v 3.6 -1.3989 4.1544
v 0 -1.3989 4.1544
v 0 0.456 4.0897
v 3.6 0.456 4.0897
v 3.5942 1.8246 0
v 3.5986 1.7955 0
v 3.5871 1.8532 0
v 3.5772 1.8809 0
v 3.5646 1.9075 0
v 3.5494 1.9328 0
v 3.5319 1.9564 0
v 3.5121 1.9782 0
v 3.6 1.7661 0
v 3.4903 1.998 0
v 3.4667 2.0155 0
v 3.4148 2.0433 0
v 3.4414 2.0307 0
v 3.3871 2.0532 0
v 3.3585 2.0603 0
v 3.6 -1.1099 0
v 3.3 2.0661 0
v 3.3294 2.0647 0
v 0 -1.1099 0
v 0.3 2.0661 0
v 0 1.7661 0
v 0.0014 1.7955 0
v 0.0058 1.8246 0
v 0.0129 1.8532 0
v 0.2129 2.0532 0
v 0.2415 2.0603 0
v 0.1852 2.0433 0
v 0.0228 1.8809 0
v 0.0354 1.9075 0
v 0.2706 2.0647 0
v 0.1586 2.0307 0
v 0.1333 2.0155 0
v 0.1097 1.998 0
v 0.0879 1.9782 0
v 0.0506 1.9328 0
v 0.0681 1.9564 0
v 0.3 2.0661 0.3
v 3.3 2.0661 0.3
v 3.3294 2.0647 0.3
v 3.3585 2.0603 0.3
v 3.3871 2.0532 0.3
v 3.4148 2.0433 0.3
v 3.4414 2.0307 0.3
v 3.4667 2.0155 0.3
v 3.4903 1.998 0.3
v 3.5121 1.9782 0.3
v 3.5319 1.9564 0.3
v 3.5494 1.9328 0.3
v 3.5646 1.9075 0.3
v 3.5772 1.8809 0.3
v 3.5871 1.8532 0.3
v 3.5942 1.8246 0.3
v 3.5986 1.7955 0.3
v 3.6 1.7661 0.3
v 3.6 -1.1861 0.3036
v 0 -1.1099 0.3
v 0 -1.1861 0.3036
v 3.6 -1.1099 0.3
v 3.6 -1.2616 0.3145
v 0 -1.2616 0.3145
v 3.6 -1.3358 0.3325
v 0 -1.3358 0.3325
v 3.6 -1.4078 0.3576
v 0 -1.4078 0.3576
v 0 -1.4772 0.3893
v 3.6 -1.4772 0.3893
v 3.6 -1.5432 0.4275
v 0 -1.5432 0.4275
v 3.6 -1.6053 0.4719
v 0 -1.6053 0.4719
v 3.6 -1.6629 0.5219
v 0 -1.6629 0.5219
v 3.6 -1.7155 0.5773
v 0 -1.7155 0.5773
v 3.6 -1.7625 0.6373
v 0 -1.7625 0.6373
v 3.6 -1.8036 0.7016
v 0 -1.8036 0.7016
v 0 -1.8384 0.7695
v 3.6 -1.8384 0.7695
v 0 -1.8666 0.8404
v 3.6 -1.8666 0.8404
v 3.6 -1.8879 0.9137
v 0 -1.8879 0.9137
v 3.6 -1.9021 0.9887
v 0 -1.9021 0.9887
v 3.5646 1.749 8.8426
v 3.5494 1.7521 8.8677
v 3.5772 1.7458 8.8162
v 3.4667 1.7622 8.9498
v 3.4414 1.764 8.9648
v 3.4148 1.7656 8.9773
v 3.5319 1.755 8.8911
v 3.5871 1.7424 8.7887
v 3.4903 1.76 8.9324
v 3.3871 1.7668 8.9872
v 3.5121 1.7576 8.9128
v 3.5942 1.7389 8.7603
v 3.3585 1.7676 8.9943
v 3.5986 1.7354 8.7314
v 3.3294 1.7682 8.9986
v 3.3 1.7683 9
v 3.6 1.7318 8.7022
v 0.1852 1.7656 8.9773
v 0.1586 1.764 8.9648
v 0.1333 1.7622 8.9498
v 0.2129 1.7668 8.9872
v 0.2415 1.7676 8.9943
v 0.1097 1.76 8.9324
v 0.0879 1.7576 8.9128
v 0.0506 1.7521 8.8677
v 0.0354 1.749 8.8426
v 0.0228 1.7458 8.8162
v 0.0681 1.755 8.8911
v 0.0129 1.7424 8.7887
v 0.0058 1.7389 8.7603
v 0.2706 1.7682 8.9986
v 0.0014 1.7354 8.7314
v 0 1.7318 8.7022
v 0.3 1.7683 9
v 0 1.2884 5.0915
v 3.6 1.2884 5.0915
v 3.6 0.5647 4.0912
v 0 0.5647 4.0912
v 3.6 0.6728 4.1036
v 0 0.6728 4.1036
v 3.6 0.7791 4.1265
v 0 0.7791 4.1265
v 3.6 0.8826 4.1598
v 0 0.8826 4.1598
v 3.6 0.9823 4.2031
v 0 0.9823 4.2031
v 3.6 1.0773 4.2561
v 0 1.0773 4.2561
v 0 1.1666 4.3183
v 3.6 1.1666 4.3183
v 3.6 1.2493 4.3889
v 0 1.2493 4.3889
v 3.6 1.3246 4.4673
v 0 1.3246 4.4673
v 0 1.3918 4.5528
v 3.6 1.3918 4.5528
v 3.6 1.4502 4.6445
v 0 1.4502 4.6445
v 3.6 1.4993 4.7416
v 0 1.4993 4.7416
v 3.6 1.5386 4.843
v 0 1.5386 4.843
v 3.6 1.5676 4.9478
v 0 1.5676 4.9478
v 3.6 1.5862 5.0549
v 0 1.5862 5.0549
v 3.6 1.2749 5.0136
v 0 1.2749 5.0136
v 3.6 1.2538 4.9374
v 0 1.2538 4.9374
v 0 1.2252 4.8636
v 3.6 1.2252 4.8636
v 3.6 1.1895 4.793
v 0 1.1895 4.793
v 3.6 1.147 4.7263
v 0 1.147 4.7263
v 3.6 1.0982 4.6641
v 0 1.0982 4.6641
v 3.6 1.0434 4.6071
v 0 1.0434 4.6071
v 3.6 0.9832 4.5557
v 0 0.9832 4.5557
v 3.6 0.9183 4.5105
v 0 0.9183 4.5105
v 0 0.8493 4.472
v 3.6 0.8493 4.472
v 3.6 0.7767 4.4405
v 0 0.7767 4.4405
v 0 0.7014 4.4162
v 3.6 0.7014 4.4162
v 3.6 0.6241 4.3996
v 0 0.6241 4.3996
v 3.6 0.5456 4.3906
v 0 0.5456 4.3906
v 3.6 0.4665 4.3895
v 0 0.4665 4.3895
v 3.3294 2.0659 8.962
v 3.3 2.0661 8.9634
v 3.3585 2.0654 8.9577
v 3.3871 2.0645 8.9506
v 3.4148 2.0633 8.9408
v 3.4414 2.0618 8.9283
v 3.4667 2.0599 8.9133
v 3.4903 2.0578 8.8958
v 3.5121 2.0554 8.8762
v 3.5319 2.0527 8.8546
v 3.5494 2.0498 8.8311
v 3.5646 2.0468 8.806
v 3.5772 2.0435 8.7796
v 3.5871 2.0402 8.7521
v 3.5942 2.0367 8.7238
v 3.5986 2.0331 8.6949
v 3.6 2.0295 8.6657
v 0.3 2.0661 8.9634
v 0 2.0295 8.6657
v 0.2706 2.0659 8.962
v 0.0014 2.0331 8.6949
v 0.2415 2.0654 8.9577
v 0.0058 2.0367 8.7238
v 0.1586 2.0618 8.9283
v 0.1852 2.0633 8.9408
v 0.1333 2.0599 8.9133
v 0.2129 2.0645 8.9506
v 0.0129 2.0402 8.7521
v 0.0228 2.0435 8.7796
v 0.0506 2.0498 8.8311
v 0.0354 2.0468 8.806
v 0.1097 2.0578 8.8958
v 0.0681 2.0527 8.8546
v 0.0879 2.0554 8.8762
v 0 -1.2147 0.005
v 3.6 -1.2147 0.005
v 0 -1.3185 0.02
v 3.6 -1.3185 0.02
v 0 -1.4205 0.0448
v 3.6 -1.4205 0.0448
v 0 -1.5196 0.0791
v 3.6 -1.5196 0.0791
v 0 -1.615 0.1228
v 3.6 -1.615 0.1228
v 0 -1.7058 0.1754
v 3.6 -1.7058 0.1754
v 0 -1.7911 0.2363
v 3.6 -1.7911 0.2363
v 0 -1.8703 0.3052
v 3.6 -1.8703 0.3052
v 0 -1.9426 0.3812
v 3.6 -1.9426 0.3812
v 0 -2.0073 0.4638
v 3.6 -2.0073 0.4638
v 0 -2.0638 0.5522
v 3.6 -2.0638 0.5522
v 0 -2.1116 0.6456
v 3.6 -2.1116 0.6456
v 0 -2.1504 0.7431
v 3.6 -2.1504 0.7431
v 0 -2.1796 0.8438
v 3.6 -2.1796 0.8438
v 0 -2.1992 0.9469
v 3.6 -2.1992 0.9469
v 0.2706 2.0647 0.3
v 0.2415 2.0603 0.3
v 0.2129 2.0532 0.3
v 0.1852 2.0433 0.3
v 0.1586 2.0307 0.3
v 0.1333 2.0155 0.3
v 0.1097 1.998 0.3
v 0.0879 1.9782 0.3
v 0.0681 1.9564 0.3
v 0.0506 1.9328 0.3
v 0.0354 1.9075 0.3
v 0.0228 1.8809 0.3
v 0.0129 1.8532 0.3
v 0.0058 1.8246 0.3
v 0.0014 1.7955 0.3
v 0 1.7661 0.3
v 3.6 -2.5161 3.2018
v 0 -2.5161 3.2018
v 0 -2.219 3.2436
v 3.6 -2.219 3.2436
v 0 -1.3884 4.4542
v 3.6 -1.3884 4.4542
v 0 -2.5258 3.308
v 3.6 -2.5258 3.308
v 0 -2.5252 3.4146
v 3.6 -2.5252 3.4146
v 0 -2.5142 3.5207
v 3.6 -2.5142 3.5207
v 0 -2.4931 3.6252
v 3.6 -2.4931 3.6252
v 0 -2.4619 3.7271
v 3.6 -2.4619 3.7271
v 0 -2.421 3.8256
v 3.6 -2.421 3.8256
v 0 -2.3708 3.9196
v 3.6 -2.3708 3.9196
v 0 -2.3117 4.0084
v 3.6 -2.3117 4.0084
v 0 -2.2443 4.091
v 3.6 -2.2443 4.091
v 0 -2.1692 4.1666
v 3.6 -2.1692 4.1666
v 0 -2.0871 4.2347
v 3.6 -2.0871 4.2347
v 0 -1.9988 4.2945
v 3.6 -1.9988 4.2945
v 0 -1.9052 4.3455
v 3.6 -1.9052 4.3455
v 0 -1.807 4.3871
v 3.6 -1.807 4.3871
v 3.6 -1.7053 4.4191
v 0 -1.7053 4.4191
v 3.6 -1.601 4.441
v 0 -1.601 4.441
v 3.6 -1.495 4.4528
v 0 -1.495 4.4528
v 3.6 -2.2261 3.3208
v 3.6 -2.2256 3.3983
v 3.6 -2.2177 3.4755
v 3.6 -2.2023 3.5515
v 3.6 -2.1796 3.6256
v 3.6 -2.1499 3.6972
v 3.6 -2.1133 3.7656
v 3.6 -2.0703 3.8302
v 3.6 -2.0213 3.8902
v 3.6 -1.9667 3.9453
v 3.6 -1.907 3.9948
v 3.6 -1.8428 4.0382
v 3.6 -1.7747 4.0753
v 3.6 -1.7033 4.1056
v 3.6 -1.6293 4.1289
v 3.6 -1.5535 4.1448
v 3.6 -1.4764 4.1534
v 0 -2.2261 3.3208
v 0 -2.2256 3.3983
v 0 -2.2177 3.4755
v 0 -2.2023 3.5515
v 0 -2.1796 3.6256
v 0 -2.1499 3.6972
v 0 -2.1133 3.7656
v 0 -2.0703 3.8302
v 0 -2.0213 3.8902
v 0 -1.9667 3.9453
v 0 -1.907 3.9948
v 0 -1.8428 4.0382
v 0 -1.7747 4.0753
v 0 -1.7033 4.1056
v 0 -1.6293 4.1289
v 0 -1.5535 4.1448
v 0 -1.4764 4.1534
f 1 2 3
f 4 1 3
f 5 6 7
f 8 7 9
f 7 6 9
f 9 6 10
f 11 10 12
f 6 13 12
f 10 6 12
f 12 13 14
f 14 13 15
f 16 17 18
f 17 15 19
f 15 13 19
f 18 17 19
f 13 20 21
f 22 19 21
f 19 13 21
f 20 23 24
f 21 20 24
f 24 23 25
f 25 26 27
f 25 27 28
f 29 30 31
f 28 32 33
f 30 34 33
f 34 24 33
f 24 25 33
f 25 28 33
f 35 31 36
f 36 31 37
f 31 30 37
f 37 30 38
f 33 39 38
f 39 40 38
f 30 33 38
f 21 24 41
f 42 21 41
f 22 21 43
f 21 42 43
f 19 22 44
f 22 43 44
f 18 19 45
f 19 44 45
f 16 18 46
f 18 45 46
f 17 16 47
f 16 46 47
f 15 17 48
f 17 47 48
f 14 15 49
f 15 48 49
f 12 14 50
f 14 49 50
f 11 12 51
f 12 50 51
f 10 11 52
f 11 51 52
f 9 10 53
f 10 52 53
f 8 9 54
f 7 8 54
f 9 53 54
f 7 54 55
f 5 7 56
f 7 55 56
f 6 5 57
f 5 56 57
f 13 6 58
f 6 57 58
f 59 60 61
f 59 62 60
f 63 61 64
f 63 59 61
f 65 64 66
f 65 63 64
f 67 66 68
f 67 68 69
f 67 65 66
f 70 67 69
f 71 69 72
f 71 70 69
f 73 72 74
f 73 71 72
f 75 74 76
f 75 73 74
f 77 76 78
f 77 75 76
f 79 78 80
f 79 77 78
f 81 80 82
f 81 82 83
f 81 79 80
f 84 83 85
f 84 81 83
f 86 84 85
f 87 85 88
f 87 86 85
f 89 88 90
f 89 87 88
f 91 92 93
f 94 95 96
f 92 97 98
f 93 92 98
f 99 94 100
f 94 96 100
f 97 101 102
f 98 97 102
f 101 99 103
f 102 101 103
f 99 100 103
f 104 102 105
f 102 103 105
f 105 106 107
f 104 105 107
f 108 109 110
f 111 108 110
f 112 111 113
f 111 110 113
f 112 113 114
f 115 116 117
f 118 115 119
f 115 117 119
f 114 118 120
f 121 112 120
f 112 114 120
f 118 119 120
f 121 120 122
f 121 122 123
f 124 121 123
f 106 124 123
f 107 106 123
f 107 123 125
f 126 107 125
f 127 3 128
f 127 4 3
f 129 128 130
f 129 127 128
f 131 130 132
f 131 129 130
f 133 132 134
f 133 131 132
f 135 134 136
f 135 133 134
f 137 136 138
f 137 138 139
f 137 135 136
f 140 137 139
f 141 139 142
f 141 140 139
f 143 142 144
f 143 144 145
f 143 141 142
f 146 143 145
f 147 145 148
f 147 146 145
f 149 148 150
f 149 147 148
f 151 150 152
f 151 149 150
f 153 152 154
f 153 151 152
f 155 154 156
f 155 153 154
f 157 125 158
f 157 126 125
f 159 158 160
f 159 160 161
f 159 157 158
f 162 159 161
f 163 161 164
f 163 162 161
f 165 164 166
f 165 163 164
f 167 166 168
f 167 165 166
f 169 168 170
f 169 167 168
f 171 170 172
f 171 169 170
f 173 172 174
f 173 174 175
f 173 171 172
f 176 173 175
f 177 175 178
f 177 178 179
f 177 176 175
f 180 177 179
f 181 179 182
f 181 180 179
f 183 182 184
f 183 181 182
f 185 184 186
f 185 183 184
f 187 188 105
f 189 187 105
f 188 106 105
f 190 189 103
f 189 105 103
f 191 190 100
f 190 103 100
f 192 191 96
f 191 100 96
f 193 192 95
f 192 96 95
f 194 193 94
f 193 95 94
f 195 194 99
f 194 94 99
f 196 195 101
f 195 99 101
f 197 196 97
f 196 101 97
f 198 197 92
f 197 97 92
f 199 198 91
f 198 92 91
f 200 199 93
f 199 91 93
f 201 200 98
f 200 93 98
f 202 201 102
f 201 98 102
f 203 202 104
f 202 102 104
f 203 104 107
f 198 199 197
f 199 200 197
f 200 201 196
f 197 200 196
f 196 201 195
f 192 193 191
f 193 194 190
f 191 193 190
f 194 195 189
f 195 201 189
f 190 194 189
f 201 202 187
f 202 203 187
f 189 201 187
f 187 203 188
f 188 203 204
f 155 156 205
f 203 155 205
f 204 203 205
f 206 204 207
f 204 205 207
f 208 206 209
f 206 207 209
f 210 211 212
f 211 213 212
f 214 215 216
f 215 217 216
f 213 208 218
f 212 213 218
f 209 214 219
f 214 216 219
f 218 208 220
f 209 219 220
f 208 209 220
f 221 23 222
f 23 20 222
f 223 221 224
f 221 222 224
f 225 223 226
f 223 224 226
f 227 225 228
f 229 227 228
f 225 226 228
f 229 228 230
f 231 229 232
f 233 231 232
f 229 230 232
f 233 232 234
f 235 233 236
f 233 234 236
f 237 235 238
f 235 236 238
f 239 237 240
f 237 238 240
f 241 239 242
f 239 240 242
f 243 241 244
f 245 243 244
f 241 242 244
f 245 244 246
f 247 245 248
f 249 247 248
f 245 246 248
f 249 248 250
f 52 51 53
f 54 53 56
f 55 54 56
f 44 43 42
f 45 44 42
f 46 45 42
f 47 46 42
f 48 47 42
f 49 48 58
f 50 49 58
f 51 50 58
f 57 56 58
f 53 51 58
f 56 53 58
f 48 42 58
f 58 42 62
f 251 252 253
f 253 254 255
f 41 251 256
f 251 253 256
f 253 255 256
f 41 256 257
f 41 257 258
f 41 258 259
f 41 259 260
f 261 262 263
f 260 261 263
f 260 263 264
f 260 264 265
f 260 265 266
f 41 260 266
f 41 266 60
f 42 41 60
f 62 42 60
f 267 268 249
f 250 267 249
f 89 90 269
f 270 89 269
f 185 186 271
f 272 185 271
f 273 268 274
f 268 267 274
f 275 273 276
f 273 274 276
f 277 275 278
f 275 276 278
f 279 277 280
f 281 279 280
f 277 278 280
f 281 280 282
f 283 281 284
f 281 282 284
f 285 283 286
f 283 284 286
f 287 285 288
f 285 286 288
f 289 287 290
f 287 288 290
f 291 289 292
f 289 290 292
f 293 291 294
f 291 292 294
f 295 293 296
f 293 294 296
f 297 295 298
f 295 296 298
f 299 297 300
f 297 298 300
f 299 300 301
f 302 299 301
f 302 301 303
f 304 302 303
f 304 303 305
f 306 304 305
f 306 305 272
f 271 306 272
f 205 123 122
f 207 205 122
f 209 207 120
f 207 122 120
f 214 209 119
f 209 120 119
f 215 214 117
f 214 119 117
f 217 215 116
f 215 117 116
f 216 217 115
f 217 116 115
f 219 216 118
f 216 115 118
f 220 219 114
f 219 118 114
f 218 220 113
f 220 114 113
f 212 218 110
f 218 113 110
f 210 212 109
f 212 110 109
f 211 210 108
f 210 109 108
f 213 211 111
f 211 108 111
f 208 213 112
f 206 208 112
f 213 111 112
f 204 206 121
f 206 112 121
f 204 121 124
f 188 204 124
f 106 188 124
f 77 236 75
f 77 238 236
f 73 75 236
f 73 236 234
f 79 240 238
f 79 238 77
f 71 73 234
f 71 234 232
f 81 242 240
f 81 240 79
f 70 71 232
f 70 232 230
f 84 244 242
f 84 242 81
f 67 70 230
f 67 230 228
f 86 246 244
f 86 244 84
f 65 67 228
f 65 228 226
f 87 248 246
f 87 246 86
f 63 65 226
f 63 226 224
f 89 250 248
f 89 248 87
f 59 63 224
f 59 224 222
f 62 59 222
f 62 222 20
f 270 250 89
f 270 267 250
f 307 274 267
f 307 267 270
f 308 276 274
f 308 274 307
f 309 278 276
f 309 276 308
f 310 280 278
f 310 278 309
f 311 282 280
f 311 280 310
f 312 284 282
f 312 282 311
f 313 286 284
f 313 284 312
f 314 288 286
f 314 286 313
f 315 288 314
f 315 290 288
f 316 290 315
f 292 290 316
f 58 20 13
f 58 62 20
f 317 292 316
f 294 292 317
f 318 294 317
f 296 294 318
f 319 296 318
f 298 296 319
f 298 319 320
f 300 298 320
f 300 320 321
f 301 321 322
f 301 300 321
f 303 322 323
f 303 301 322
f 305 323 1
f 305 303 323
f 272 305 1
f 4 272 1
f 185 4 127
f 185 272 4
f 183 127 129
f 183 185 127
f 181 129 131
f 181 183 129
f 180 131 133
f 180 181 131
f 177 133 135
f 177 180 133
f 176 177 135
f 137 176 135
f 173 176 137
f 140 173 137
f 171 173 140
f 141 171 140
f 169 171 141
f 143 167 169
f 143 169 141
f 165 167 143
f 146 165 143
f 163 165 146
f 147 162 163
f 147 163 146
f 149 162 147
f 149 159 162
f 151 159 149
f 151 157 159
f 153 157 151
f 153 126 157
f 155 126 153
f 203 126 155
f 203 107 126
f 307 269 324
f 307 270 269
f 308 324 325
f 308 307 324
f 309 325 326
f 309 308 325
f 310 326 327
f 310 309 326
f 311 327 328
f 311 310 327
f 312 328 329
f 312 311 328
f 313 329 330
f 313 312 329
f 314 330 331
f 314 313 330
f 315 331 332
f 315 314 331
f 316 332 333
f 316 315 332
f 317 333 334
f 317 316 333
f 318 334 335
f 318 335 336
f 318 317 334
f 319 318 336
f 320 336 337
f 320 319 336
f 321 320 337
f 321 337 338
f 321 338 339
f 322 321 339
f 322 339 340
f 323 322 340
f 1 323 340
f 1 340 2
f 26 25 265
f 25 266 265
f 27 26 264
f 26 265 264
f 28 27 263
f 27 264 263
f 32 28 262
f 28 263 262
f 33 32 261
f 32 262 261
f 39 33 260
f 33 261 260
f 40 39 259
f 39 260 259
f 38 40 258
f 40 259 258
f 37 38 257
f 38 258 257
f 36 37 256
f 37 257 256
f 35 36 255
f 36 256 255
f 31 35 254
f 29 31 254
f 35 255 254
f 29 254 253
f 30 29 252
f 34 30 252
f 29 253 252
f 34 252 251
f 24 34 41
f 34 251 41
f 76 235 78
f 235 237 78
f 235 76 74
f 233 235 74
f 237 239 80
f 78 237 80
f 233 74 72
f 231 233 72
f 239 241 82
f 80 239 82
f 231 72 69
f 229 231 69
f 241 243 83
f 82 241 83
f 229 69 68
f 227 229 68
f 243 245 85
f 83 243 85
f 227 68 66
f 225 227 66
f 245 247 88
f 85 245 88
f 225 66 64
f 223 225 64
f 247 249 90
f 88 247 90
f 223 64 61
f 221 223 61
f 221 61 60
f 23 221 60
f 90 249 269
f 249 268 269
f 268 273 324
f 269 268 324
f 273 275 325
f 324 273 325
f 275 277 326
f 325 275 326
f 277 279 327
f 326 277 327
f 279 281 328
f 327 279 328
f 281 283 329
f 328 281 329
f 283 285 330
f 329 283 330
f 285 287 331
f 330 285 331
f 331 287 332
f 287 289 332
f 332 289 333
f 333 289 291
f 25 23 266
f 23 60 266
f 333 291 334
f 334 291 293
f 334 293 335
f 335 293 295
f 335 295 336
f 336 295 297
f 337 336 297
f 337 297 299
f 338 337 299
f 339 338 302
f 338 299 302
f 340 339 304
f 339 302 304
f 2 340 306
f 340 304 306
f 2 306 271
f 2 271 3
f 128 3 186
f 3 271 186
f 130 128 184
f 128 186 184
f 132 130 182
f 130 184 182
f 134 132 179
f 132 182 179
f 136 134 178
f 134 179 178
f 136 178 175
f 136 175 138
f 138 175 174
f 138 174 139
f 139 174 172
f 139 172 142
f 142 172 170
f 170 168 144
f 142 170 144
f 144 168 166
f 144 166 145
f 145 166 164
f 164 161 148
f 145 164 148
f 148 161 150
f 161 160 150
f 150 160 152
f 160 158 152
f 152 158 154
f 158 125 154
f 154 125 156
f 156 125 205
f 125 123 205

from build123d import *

# Parameters (mm, degrees)
F1_DEPTH = 3.6
F2_R     = 0.8
F3_R     = 1.1
F4_R     = 0.3


with BuildPart() as f1:
    # F0 (on Right) → F1 (new body)
    with BuildSketch(Plane.YZ):
        Polygon((-2.066098, 0), (2.066098, 0), (2.066098, 0.3), (-1.805312, 0.3), (-2.351694, 4.187705), (1.463354, 4.054481), (2.066098, 8.963439), (1.768335, 9), (1.199092, 4.363892), (-2.698532, 4.5), align=None)
    extrude(amount=F1_DEPTH)

    # F2
    f2_edges = [f1.edges().sort_by_distance(p)[0] for p in [
        (1.8, -2.351694, 4.187705),
        (1.8, -1.805312, 0.3),
        (1.8, 1.199092, 4.363892),
    ]]
    fillet(f2_edges, radius=F2_R)

    # F3
    f3_edges = [f1.edges().sort_by_distance(p)[0] for p in [
        (1.8, -2.698532, 4.5),
        (1.8, 1.463354, 4.054481),
        (1.8, -2.066098, 0),
    ]]
    fillet(f3_edges, radius=F3_R)

    # F4
    f4_edges = [f1.edges().sort_by_distance(p)[0] for p in [
        (3.6, 1.917216, 8.98172),
        (0, 1.917216, 8.98172),
        (3.6, 2.066098, 0.15),
        (0, 2.066098, 0.15),
    ]]
    fillet(f4_edges, radius=F4_R)


solid = f1.part
